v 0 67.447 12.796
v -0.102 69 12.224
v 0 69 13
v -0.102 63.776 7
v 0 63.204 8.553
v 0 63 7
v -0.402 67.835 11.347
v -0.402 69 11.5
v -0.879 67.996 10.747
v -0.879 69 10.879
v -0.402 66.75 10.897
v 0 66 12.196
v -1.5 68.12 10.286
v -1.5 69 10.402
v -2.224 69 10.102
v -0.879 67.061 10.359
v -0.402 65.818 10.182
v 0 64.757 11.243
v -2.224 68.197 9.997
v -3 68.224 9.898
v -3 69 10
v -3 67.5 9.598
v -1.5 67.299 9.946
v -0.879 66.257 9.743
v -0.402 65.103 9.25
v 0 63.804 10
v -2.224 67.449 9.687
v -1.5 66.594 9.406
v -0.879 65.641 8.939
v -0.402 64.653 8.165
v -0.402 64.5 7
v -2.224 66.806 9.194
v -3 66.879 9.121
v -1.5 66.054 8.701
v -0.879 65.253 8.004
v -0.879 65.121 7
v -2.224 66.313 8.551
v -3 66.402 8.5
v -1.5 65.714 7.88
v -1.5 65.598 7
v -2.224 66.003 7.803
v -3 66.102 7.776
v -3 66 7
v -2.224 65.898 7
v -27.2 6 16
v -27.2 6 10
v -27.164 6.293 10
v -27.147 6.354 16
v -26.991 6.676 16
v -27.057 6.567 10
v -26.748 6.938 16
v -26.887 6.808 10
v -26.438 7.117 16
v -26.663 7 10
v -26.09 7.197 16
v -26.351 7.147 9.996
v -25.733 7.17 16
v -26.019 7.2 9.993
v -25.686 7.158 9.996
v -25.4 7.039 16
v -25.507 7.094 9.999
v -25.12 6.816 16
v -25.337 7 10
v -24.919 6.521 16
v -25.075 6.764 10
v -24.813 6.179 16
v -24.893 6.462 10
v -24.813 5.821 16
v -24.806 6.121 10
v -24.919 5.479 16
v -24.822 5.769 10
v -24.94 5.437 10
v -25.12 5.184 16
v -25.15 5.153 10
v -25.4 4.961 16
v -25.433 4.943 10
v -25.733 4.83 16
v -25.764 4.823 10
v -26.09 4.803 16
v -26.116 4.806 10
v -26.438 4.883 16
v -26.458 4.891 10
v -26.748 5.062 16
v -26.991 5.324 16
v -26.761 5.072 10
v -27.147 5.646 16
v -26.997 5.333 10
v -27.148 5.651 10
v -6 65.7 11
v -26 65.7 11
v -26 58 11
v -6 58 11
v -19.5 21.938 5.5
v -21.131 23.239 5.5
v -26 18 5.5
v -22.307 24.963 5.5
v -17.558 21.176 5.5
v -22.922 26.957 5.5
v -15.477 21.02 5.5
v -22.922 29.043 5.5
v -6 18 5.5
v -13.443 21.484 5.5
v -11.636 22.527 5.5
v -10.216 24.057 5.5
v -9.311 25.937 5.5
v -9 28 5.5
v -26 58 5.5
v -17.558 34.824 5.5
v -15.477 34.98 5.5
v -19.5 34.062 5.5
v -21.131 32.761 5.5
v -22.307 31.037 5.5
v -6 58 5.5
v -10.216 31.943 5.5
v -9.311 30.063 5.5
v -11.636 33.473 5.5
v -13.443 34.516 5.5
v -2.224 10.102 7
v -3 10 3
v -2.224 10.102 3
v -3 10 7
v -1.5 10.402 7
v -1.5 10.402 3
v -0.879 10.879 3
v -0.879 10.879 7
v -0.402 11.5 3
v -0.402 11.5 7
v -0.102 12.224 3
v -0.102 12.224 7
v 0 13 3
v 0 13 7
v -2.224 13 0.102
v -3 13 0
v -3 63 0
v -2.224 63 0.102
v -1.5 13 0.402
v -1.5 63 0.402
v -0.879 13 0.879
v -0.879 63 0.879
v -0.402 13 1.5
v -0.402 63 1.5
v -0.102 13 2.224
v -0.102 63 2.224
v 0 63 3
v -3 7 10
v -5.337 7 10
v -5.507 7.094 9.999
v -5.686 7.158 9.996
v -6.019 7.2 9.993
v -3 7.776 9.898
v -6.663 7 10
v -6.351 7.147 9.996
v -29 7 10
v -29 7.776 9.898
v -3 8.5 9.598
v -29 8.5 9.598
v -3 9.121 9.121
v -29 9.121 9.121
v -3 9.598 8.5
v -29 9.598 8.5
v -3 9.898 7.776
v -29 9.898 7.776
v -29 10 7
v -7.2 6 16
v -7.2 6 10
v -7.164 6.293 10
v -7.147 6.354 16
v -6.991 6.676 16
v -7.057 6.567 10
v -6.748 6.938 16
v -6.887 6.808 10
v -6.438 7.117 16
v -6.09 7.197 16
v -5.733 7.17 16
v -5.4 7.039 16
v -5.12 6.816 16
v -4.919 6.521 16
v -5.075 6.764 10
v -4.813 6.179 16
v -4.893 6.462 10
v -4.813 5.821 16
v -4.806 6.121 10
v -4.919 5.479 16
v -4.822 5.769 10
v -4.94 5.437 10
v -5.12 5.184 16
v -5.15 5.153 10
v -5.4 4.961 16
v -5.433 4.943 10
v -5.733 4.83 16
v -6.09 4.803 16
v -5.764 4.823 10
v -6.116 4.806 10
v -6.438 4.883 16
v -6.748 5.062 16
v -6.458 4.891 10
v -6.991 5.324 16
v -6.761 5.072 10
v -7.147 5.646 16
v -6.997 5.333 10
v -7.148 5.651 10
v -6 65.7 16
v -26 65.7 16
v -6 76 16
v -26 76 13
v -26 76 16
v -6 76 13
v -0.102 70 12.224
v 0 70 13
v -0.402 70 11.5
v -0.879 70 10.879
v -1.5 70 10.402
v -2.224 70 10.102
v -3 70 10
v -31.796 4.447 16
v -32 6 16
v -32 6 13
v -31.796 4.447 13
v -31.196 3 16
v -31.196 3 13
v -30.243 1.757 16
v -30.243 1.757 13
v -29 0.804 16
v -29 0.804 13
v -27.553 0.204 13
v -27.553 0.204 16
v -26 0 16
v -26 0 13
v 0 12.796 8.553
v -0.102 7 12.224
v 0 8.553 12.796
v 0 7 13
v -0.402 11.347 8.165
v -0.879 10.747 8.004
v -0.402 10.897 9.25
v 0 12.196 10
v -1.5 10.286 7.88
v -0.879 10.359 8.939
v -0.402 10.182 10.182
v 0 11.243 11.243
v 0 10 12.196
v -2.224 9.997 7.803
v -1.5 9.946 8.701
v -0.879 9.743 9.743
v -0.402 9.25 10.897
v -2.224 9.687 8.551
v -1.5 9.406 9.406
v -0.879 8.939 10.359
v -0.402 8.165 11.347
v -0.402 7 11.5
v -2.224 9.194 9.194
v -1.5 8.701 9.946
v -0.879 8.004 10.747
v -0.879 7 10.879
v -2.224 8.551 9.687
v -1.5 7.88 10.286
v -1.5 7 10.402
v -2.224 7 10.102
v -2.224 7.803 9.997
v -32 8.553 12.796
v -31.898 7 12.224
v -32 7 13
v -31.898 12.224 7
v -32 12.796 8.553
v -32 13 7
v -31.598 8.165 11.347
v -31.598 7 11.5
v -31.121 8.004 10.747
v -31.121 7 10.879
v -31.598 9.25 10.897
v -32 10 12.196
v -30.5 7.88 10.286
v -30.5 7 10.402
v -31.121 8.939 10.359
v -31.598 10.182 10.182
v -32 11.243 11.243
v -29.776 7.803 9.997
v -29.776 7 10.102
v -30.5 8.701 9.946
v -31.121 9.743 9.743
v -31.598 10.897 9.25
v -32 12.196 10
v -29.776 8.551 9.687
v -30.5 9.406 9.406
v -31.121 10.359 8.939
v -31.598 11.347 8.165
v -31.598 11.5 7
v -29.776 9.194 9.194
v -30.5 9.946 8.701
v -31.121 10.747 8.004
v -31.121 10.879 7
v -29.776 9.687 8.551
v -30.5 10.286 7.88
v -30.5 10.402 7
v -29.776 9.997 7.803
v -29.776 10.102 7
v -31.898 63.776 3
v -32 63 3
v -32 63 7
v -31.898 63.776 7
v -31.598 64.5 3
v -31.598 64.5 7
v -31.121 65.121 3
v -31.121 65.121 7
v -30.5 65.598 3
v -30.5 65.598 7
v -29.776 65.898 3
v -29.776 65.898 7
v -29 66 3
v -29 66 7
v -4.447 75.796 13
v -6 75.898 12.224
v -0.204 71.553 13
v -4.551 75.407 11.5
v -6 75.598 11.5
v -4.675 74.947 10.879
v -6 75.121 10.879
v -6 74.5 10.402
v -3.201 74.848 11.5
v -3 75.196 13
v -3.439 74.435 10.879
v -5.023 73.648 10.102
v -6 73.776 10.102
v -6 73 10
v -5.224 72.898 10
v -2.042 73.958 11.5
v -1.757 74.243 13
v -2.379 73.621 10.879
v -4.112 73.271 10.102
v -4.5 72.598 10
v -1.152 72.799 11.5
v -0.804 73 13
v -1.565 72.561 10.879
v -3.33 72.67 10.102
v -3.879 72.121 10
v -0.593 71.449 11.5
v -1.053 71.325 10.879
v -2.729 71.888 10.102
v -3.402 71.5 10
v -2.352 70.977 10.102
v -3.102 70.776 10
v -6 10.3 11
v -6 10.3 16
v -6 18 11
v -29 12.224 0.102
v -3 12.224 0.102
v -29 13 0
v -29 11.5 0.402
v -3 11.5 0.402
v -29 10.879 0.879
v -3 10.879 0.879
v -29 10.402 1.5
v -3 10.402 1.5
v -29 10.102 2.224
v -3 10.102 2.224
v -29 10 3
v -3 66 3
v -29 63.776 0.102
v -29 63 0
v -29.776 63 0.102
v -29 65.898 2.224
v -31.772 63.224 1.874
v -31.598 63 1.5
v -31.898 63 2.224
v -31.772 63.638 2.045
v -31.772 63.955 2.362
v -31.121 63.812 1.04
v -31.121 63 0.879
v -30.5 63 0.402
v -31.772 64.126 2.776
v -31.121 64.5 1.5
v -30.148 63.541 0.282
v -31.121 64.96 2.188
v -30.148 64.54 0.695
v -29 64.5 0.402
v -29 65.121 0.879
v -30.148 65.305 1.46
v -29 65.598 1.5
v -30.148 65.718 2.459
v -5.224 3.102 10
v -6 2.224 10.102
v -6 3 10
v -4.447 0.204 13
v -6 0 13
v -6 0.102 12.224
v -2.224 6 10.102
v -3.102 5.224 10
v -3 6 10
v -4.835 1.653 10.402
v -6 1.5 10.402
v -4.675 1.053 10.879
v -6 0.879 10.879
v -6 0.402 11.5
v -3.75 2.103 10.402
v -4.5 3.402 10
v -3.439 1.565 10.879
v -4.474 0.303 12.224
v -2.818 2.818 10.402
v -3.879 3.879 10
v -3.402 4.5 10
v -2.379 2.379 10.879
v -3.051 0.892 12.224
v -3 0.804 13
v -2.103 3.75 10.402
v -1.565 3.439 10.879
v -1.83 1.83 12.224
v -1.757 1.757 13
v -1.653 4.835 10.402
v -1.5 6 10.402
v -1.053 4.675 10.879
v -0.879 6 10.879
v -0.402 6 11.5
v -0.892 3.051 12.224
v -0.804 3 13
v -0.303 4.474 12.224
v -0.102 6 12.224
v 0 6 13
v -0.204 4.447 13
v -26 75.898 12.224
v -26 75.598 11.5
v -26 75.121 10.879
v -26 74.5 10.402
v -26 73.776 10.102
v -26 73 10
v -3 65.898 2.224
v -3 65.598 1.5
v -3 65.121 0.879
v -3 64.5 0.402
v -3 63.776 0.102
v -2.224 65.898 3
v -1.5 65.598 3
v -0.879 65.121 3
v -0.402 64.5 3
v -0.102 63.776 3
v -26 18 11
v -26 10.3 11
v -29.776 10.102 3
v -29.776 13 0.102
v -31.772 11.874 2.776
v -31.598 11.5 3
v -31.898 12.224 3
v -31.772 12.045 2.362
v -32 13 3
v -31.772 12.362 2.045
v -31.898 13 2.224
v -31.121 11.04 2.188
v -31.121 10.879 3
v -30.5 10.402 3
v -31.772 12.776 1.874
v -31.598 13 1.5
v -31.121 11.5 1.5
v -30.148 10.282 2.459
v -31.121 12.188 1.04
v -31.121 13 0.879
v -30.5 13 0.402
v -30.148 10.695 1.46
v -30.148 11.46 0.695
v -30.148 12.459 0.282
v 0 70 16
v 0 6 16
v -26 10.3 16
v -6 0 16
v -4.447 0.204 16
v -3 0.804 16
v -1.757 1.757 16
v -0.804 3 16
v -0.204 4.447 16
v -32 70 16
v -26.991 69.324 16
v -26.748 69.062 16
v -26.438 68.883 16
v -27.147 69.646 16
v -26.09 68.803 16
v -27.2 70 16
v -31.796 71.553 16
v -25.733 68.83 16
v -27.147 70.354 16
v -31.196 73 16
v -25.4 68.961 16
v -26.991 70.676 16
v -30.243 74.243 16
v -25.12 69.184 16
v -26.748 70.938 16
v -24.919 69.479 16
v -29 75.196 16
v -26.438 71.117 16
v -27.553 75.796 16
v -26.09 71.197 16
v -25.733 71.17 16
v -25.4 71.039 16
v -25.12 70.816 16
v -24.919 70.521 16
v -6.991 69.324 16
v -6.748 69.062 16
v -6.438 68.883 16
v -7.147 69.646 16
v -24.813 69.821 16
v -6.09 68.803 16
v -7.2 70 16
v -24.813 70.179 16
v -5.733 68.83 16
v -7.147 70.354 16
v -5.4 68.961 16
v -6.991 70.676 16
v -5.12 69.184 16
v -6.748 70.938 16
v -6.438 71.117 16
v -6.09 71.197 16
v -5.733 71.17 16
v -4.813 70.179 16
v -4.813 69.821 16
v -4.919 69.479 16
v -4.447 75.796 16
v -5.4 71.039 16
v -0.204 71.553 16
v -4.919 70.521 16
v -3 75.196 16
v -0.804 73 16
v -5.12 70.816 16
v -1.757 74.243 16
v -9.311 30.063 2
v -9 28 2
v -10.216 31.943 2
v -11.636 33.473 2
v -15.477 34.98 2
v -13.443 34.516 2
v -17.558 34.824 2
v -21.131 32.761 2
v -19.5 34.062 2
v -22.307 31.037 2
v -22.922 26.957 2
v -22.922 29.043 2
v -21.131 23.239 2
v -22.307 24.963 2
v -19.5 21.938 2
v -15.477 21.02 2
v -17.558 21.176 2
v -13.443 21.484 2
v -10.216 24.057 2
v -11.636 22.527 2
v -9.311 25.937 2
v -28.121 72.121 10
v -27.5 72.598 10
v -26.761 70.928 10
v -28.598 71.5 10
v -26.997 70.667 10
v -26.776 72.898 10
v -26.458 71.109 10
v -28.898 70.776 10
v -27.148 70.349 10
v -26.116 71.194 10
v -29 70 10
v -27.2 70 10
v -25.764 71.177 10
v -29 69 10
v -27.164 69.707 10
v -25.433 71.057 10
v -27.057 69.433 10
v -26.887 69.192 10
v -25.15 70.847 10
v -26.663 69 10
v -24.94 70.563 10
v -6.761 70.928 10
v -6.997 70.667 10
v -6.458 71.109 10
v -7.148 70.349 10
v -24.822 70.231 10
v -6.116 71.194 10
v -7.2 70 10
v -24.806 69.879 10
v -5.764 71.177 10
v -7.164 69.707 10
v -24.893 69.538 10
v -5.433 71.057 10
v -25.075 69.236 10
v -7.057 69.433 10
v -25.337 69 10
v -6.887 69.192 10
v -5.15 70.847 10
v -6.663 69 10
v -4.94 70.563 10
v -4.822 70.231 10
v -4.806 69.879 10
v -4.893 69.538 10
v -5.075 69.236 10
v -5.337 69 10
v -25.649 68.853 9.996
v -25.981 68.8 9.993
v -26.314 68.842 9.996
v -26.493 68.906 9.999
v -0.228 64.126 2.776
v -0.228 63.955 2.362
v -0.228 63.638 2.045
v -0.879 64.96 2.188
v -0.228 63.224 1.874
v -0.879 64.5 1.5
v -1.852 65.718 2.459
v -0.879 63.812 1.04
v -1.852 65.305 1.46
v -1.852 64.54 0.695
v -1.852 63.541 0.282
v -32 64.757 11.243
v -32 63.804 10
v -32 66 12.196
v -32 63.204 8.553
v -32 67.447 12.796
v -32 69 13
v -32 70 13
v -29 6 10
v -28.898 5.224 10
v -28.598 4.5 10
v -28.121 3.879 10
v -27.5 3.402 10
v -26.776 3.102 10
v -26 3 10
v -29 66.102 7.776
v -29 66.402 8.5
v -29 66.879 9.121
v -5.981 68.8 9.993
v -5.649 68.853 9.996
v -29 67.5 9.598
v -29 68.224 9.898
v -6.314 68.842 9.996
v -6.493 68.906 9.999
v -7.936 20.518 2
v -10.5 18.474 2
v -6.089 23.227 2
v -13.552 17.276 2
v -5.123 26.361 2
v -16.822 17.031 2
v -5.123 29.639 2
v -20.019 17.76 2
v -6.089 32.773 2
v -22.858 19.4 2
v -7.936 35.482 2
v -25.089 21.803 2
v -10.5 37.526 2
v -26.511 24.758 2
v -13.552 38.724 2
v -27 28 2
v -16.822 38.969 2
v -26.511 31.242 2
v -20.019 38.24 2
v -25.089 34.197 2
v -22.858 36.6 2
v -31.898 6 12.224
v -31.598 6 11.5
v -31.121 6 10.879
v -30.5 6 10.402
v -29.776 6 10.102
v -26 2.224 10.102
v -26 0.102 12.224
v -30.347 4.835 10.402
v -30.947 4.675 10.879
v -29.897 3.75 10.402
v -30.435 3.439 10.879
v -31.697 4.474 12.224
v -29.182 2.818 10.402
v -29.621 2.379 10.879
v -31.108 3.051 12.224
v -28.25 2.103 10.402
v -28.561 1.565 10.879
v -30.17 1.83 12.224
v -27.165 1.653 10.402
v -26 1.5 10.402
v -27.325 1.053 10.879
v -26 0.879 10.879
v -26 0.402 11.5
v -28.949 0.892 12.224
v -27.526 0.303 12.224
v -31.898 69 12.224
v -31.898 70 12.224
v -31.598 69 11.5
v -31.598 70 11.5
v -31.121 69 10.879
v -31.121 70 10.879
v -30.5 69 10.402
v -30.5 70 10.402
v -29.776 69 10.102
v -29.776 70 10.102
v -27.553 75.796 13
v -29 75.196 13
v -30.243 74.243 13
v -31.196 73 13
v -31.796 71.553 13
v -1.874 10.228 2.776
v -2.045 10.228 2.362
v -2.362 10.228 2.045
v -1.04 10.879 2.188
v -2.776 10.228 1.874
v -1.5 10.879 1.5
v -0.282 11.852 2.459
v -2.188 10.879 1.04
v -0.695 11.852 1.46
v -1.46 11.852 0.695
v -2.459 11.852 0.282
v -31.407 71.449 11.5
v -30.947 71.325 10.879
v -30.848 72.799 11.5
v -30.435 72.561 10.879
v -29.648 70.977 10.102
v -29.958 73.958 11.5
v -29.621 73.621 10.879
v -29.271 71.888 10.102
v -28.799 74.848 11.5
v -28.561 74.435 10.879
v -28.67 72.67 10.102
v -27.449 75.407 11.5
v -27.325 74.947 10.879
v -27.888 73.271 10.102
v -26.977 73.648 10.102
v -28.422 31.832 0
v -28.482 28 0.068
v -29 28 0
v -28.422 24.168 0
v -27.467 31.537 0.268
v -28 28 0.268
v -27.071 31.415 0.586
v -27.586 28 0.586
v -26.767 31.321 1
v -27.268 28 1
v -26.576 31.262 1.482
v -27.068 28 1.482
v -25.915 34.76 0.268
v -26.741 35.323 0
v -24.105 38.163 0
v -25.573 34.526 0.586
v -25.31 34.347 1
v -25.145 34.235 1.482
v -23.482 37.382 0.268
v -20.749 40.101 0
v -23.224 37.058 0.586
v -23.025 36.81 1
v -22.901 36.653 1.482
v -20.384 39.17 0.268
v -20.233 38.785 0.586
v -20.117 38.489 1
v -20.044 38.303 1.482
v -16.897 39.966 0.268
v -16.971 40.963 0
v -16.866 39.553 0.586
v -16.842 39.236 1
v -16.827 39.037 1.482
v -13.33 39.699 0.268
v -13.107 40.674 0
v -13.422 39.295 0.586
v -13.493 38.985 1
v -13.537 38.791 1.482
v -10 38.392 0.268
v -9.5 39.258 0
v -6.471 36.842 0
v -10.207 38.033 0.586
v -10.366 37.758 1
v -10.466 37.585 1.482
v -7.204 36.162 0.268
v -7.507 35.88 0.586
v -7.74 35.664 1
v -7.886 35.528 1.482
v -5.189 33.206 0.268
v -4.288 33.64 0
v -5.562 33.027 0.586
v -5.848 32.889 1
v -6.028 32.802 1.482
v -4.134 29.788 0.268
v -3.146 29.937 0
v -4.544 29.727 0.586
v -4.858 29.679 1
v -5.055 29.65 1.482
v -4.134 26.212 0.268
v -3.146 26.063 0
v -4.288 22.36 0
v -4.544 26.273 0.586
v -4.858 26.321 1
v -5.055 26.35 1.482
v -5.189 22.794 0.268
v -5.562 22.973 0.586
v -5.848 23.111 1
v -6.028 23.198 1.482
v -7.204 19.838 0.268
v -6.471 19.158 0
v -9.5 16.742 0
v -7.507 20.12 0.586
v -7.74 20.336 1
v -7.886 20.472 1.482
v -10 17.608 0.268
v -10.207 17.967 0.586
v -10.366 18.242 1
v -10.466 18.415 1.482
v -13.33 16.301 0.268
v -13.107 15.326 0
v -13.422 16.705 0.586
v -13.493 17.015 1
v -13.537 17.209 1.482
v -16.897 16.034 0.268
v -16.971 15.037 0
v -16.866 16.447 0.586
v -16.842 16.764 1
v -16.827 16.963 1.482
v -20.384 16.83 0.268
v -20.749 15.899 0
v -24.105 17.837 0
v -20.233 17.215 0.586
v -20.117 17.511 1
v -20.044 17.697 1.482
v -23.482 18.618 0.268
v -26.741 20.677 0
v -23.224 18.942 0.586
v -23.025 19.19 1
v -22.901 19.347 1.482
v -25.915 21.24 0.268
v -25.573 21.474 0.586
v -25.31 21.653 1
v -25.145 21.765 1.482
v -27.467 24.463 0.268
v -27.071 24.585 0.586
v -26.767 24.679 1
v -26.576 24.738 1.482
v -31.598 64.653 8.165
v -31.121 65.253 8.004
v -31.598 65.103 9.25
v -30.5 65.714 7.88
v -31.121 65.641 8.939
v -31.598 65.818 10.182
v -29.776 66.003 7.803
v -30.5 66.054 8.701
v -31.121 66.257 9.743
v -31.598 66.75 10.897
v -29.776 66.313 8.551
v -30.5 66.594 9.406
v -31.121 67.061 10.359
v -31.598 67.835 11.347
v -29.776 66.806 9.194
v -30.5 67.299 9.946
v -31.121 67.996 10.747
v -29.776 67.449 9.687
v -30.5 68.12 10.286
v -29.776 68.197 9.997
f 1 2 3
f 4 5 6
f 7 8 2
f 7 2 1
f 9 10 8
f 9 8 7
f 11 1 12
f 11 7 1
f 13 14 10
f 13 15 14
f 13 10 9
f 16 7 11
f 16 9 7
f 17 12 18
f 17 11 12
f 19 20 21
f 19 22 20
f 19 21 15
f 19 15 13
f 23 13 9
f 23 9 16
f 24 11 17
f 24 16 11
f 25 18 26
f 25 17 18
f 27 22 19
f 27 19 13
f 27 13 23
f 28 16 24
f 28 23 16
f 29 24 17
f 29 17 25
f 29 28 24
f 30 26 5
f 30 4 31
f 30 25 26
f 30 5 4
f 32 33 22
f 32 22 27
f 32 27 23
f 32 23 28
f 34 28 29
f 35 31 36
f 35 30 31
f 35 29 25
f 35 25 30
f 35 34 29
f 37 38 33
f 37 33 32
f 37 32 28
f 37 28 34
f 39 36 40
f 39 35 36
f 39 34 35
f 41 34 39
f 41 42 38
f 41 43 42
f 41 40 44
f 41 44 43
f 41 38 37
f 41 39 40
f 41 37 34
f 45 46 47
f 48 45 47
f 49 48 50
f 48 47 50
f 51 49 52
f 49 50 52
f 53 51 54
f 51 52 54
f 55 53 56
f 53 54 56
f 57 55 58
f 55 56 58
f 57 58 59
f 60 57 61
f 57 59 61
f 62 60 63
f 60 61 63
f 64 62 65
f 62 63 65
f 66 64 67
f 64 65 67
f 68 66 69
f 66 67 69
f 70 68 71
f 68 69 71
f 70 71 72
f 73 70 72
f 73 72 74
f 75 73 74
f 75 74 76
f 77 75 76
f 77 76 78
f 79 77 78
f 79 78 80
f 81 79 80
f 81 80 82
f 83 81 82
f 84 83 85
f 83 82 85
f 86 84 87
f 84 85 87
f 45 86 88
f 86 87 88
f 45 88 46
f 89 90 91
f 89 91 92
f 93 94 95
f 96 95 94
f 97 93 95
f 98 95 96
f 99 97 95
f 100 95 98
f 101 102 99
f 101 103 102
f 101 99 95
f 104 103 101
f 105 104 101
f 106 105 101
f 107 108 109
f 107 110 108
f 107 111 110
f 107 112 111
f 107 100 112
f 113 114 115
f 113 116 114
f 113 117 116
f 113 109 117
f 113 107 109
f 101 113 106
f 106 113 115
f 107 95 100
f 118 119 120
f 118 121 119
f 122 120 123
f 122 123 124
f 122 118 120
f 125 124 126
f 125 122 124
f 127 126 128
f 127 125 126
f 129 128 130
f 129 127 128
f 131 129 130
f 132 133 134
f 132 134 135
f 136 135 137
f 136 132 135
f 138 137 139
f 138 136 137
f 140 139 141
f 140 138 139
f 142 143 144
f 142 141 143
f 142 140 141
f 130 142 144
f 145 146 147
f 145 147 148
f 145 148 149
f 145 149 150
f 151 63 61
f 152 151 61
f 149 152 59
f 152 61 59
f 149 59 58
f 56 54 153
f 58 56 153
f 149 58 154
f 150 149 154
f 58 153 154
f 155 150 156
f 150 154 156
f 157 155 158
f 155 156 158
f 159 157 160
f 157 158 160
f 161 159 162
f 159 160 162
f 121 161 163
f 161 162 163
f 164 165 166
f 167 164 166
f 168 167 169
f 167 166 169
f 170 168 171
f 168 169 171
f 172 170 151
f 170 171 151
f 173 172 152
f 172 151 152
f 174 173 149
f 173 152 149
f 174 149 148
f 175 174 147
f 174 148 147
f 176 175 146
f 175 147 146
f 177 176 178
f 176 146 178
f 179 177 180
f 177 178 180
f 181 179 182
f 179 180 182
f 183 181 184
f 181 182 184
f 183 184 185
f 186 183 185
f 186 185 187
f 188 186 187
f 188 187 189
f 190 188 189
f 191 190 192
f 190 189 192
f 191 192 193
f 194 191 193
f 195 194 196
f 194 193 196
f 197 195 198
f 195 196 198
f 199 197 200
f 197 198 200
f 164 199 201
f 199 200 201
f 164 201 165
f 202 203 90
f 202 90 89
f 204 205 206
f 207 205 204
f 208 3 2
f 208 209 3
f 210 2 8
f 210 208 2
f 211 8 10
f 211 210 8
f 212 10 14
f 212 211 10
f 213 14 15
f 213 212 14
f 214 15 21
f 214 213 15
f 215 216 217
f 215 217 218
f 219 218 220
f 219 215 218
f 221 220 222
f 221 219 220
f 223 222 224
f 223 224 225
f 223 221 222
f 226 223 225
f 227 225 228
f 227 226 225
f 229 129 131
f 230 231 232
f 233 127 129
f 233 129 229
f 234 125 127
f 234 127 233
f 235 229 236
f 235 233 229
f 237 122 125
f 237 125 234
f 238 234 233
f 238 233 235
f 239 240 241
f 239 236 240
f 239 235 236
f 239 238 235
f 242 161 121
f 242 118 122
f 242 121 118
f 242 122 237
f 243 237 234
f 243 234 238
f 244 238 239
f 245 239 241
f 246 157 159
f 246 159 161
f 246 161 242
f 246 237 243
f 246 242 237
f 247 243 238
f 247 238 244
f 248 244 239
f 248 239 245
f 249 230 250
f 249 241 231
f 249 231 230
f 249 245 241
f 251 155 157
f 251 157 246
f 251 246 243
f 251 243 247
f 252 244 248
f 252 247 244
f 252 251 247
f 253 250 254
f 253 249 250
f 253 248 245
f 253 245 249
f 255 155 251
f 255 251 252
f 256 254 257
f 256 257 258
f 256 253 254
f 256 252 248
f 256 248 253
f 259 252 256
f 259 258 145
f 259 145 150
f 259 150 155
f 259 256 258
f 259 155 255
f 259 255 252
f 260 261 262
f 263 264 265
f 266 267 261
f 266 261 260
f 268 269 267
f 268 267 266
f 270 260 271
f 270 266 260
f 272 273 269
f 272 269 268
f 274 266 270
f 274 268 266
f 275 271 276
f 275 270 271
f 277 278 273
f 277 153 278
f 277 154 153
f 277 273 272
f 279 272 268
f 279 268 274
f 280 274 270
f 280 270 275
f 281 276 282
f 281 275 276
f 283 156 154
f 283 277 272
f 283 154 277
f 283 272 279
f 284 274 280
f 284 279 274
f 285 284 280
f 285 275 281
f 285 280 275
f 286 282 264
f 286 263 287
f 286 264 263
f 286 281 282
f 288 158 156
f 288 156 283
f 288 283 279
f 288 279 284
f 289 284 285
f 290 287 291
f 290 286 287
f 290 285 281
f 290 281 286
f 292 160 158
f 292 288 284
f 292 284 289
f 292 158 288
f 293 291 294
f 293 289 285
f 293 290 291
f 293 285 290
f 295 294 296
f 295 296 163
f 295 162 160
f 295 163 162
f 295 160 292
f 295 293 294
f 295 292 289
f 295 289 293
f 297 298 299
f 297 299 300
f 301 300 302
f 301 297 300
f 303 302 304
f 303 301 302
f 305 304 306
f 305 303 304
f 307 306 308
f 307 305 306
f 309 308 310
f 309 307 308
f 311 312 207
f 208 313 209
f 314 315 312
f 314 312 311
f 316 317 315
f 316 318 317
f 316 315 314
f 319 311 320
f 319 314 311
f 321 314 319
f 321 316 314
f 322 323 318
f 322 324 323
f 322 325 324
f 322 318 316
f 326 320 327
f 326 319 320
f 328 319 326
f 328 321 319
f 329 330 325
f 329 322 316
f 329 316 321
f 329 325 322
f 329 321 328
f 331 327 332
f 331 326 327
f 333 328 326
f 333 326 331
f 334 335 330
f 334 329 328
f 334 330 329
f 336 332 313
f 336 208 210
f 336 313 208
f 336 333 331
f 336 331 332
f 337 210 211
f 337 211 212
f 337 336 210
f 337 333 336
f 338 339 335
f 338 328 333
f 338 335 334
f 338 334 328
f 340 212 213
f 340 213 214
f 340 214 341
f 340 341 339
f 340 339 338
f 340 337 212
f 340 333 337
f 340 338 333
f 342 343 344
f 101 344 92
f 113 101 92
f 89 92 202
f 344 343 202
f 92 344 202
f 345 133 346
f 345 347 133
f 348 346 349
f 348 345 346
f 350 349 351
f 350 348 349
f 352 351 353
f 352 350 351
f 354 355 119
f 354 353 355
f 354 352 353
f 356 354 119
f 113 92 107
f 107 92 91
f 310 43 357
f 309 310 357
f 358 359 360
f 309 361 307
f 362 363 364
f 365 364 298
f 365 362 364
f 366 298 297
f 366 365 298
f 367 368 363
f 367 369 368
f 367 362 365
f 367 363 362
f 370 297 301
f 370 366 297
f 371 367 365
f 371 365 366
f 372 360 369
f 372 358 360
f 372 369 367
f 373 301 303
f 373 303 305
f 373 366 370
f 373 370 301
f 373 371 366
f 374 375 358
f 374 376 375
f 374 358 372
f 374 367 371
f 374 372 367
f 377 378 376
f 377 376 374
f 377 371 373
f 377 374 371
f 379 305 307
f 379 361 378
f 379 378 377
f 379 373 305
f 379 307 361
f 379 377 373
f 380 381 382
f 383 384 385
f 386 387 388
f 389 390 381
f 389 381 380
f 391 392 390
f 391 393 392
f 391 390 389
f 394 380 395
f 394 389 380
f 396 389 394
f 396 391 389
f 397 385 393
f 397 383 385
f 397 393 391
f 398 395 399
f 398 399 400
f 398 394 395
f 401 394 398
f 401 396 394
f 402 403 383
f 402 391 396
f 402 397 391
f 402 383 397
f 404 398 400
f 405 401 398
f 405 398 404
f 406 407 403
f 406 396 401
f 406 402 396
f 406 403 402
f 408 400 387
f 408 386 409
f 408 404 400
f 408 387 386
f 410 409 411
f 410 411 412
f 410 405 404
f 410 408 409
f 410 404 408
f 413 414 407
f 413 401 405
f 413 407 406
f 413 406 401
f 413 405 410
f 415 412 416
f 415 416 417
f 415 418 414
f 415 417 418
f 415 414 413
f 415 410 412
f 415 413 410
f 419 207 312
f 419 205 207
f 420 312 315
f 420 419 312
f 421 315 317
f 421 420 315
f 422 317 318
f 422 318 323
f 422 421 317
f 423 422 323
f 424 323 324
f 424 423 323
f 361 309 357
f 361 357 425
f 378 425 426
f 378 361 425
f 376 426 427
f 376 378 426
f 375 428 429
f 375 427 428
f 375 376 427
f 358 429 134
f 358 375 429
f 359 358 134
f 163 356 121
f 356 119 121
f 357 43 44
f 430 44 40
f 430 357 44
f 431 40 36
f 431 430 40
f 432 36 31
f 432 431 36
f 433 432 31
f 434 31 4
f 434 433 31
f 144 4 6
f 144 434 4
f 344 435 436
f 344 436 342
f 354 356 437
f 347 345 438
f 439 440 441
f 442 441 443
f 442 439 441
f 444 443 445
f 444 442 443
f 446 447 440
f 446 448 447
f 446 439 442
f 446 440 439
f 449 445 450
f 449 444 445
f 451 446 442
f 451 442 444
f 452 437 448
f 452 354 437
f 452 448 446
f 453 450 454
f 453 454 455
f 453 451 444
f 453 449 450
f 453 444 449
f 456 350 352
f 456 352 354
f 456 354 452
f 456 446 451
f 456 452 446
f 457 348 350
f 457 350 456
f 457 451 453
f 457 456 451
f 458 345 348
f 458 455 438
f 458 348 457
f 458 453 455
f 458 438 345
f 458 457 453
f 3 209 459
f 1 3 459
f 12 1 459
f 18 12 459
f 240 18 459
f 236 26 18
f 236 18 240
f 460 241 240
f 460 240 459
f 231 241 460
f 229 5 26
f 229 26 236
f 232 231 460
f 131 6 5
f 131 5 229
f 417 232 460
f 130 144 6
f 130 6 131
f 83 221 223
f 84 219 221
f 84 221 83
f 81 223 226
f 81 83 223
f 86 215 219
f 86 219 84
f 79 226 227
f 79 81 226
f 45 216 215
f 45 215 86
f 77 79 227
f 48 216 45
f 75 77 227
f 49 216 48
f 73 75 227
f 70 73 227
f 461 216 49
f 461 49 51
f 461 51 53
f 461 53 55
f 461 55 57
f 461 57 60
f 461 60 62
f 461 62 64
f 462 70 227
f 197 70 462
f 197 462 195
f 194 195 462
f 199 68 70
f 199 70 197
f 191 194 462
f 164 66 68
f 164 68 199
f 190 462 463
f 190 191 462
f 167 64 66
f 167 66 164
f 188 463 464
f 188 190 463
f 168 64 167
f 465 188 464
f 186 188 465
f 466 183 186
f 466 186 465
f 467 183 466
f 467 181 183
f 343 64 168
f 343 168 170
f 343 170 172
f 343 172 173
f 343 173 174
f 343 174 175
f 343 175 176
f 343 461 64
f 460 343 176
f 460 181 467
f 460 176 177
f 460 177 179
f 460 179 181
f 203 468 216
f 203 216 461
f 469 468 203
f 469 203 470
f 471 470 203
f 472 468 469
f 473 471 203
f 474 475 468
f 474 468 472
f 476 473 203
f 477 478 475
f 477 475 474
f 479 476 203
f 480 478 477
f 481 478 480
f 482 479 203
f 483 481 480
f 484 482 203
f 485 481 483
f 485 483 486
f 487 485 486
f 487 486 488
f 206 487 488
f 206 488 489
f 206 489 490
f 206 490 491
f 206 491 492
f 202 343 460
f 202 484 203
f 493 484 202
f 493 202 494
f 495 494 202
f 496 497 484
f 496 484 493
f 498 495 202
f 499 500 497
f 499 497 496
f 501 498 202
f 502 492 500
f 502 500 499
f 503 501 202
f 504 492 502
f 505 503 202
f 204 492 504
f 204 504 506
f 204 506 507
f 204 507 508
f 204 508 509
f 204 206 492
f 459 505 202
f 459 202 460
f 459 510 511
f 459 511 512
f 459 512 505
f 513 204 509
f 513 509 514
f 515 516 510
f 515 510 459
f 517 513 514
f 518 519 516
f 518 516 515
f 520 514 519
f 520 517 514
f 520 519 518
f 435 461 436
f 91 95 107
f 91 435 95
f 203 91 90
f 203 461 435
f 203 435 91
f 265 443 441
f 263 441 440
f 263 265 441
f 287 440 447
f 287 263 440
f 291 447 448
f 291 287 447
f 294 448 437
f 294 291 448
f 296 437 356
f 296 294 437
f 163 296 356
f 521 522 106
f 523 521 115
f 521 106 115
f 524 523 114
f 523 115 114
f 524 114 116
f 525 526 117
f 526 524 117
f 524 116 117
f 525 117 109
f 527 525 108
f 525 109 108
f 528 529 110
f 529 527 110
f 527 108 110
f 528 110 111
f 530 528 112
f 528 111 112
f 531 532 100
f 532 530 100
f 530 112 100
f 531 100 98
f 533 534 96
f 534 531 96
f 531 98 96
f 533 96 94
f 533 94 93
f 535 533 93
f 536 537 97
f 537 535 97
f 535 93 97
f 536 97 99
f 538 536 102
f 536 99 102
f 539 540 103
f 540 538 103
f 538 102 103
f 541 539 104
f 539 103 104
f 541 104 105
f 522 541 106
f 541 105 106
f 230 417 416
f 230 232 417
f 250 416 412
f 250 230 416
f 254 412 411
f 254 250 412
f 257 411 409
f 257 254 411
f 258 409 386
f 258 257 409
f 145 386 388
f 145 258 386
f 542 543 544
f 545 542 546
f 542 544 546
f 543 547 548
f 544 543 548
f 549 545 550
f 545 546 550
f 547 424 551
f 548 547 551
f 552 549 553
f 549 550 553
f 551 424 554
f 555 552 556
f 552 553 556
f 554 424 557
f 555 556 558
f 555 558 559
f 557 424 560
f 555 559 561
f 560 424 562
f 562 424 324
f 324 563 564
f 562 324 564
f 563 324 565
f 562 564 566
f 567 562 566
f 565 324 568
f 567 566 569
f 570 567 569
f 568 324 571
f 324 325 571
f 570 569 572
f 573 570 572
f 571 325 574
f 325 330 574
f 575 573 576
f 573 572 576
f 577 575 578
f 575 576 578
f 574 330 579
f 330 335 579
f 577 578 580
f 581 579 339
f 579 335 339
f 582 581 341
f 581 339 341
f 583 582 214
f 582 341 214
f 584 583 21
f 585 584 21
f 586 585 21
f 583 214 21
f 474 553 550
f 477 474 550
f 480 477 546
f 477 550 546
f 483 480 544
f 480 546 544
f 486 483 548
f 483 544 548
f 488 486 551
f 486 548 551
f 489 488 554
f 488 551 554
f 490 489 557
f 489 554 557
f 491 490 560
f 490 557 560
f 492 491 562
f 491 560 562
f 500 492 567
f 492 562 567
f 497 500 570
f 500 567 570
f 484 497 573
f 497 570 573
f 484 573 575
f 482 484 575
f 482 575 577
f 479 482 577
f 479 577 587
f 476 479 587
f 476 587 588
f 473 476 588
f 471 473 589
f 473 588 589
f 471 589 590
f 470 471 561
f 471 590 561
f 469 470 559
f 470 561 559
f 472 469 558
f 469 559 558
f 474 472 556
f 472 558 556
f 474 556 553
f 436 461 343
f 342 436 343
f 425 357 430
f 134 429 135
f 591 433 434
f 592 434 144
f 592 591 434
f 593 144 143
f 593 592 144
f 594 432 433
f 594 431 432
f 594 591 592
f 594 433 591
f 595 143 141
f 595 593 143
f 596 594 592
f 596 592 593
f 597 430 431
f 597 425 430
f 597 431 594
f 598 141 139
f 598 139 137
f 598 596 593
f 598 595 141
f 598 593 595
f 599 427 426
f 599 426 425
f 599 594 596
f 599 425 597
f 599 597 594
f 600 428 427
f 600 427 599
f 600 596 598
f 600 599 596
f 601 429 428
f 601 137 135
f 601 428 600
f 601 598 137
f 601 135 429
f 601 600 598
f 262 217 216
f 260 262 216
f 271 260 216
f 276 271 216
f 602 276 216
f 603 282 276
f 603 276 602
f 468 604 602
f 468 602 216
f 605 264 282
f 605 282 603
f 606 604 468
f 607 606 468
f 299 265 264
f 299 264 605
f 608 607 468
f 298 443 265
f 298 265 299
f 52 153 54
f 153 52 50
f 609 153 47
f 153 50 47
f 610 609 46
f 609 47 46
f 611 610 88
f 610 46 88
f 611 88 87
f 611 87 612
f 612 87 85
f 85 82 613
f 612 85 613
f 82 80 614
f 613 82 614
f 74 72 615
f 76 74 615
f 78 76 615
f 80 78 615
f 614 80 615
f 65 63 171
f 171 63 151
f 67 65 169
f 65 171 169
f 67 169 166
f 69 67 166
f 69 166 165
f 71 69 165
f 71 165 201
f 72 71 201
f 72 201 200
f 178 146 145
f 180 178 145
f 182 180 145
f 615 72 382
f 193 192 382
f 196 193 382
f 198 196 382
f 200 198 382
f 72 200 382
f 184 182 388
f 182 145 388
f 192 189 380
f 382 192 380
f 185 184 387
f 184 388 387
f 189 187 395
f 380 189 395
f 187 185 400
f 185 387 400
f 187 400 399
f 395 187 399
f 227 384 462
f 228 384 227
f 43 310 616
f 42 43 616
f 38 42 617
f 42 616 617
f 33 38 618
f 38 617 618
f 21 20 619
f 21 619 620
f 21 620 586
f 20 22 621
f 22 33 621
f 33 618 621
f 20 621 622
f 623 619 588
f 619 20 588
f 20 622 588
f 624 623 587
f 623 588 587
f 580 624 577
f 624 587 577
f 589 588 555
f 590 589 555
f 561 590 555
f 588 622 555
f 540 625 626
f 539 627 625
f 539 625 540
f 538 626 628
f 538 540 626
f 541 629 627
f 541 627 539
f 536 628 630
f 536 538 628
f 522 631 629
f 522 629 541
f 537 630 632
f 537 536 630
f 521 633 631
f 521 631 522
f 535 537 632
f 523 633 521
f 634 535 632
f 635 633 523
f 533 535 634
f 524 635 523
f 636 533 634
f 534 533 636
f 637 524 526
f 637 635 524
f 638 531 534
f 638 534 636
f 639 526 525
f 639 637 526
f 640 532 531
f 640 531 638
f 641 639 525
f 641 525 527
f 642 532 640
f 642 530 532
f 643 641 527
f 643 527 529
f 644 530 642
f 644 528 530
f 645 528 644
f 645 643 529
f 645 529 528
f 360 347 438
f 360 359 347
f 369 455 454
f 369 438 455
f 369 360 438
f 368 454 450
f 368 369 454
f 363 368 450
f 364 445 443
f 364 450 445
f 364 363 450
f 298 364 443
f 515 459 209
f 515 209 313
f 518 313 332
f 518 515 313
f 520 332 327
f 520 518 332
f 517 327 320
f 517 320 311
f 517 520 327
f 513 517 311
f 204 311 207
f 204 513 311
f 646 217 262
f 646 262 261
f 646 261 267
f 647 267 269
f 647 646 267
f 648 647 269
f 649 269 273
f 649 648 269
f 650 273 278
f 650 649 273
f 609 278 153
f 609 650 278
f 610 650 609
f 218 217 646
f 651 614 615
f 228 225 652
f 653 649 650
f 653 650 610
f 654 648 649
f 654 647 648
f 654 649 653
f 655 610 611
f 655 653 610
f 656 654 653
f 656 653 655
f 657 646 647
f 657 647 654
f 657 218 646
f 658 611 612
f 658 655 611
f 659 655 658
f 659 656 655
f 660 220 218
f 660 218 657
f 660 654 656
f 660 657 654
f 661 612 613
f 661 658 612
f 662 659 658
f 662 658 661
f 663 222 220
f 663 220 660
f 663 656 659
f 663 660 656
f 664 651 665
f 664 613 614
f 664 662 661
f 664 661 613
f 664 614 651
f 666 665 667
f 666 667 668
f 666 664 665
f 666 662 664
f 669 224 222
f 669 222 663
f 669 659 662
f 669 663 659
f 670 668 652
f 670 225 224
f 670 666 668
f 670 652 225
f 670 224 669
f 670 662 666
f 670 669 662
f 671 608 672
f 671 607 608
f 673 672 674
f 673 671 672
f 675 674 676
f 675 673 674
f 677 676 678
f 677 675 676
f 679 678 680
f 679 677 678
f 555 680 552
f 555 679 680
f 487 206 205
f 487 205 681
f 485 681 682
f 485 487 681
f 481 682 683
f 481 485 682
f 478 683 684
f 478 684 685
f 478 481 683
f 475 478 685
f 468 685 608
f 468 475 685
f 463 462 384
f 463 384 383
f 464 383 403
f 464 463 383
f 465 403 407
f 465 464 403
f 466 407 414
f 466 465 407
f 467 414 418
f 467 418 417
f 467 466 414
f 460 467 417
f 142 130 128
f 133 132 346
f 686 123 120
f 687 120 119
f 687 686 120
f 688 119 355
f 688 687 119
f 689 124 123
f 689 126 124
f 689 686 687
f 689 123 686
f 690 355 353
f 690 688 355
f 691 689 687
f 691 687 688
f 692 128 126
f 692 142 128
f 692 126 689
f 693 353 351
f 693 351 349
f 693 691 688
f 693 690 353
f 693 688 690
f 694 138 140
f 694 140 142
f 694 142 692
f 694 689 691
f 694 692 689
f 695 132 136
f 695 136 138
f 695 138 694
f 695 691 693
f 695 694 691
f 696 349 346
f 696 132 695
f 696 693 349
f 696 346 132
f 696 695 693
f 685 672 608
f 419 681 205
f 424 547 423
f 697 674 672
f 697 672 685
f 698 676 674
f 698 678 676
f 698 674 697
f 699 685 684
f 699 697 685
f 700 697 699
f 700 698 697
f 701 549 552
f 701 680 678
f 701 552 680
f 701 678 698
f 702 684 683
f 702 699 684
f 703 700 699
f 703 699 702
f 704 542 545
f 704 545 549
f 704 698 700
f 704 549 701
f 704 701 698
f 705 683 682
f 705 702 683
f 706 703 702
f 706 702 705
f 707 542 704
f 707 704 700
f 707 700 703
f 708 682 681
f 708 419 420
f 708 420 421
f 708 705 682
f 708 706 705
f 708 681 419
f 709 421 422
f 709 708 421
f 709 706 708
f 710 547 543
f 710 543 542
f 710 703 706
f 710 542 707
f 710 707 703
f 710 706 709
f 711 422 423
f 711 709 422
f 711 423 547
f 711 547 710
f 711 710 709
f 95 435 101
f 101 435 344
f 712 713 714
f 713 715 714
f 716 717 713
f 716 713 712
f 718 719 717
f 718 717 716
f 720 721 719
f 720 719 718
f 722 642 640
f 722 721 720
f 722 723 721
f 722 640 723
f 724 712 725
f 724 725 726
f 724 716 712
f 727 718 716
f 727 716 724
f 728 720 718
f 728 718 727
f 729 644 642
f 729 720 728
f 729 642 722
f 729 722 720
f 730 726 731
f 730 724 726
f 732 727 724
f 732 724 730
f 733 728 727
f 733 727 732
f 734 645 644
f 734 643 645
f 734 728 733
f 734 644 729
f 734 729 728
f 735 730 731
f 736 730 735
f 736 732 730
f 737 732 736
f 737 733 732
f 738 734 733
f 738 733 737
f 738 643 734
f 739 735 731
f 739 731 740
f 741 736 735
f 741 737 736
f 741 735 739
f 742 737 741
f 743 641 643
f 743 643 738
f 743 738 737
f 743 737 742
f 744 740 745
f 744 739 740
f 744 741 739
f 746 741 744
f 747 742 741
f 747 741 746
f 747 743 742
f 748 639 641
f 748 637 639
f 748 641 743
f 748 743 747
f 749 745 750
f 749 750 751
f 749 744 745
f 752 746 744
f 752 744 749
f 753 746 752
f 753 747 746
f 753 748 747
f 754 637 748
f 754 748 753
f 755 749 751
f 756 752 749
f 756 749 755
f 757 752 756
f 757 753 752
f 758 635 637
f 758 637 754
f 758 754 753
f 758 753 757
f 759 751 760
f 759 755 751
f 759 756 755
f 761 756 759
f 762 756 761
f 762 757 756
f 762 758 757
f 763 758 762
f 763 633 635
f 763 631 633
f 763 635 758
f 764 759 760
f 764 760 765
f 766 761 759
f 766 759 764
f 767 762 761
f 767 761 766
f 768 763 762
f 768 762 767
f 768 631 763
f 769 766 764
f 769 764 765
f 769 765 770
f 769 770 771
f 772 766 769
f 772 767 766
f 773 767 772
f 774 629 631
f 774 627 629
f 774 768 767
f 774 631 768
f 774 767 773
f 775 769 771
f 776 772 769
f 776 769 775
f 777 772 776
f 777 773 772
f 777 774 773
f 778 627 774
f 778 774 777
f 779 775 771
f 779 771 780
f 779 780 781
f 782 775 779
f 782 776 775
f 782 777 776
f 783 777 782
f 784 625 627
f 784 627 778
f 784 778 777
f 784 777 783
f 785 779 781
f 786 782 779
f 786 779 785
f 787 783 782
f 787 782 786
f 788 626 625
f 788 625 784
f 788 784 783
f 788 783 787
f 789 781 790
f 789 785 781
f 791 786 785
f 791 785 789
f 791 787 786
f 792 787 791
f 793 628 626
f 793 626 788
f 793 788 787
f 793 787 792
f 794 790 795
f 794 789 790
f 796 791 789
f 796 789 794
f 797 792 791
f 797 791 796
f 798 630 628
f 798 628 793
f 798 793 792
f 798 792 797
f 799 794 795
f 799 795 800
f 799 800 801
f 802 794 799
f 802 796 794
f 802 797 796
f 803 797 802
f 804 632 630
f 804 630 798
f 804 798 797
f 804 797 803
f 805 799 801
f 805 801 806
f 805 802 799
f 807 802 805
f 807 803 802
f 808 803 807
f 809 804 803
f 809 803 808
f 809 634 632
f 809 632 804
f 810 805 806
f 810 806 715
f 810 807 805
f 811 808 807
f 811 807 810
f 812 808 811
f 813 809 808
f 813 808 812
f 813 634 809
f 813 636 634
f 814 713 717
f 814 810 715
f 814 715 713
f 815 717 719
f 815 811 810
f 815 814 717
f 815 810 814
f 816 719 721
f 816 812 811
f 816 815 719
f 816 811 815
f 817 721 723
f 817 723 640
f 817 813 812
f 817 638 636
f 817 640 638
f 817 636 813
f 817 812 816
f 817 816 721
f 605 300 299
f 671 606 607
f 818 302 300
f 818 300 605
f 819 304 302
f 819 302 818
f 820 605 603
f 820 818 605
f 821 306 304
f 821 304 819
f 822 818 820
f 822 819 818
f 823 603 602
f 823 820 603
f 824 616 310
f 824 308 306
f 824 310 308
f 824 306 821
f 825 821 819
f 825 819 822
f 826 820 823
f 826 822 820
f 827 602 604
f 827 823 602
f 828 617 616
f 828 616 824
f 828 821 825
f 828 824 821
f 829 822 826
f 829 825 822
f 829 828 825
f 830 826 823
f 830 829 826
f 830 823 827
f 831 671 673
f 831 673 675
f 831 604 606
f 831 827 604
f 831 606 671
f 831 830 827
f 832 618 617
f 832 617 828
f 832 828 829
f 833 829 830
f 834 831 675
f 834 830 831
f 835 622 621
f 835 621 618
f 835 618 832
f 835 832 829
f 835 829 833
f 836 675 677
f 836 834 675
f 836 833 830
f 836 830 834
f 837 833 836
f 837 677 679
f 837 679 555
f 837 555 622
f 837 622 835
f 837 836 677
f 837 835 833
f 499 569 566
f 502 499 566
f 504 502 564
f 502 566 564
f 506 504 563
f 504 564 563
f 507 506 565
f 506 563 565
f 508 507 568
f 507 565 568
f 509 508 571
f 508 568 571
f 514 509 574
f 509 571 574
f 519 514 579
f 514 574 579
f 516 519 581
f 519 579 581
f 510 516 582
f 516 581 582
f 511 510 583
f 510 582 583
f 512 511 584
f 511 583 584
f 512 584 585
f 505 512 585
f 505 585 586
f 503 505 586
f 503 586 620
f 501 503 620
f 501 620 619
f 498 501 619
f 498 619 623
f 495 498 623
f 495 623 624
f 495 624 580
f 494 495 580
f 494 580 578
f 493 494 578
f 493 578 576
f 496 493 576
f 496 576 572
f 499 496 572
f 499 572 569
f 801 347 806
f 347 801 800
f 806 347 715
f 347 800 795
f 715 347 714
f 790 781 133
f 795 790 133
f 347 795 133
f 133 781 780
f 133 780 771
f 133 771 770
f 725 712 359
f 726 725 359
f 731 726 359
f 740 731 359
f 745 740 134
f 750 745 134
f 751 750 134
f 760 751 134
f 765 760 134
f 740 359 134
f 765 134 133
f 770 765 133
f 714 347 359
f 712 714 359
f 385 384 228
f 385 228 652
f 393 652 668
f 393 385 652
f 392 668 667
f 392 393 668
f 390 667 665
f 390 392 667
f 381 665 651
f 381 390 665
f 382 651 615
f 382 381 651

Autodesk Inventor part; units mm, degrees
ref_plane "YZ Plane" through (0, 0, 0) normal (1, 0, 0) x (0, 1, 0)
ref_plane "XZ Plane" through (0, 0, 0) normal (0, 1, 0) x (-1, 0, 0)
ref_plane "XY Plane" through (0, 0, 0) normal (0, 0, 1) x (1, 0, 0)
sketch "Sketch1" plane through (0, 0, 0) normal (0, 0, 1) x (1, 0, 0)
  line L0 (0, 0) -> (-32, 0)
  line L1 (-32, 0) -> (-32, 76)
  line L2 (-32, 76) -> (0, 76)
  line L3 (0, 76) -> (0, 0)
  dimension "d0" = 32
  dimension "d1" = 76
extrude "Extrusion1" add sketch "Sketch1" along normal blind 16
fillet "Fillet1" radius 6 4 edges at (0, 76, 8) (-32, 76, 8) (0, 0, 8) (-32, 0, 8)
sketch "Sketch2" plane through (0, 0, 16) normal (0, 0, 1) x (1, 0, 0)
  line L0 (-6, 58) -> (-26, 58)
  line L1 (-26, 58) -> (-26, 18)
  line L2 (-26, 18) -> (-6, 18)
  line L3 (-6, 18) -> (-6, 58)
  line L4 (-6, 76) -> (-26, 76) projected
  line L5 (0, 6) -> (0, 70) projected
  point P0 (0, 0)
  dimension "d5" = 20
  dimension "d6" = 40
  dimension "d7" = 18
  dimension "d8" = 6
extrude "Extrusion2" cut sketch "Sketch2" against normal blind 10.5
sketch "Sketch3" plane through (0, 0, 5.5) normal (0, 0, 1) x (1, 0, 0)
  circle A0 centre (-16, 28) radius 7
  line L0 (-6, 58) -> (-6, 18) projected
  line L1 (-6, 18) -> (-26, 18) projected
  point P0 (0, 0)
  dimension "d11" = 14
  dimension "d12" = 10
  dimension "d13" = 10
extrude "Extrusion3" cut sketch "Sketch3" against normal up to surface (5.5 mm away)
sketch "Sketch4" plane through (0, 0, 16) normal (0, 0, 1) x (1, 0, 0)
  line L0 (-26, 58) -> (-6, 58) projected
  line L1 (-6, 58) -> (-26, 58)
  line L2 (-26, 58) -> (-26, 65.7)
  line L3 (-26, 65.7) -> (-6, 65.7)
  line L4 (-6, 65.7) -> (-6, 58)
  line L5 (-6, 18) -> (-26, 18) projected
  line L6 (-6, 18) -> (-26, 18)
  line L7 (-26, 18) -> (-26, 10.3)
  line L8 (-26, 10.3) -> (-6, 10.3)
  line L9 (-6, 10.3) -> (-6, 18)
  point P0 (0, 0)
  point P1 (-26, 18)
  dimension "d16" = 7.7
  dimension "d17" = 20
  dimension "d18" = 7.7
extrude "Extrusion4" cut sketch "Sketch4" against normal blind 5
sketch "Sketch5" plane through (0, 6, 0) normal (1, 0, 0) x (0, 0, -1)
  line L0 (0, -6) -> (-16, -6) projected
  line L1 (0, -6) -> (0, 4)
  line L2 (0, 0) -> (0, -6) projected
  line L3 (0, 4) -> (-10, 4)
  line L4 (-10, 4) -> (-10, -6)
  line L5 (0, 70) -> (0, 64) projected
  line L6 (0, 70) -> (-10, 70)
  line L7 (-10, 70) -> (-10, 60)
  line L8 (-10, 60) -> (0, 60)
  line L9 (0, 60) -> (0, 70)
  dimension "d21" = 10
  dimension "d22" = 10
  dimension "d23" = 10
  dimension "d24" = 10
extrude "Extrusion5" cut sketch "Sketch5" against normal up to surface (32 mm away)
fillet "Fillet2" radius 3 20 edges at (-16, 66, 0) (0, 38, 0) (-16, 10, 0) (-32, 38, 0) (0, 66, 5) (-32, 66, 5) (0, 10, 5) (-16, 66, 10) (-32, 10, 5) (-16, 10, 10) (-16, 76, 10) (-30.2426, 74.2426, 10) (-32, 68, 10) (0, 68, 10) (-1.7574, 74.2426, 10) (-1.7574, 1.7574, 10) (0, 8, 10) (-30.2426, 1.7574, 10) (-32, 8, 10) (-16, 0, 10)
sketch "Sketch6" plane through (-3, 69, 10) normal (0, 0, -1) x (-1, 0, 0)
  arc A0 (26, 1) -> (23, 4) centre (23, 1) ccw projected
  circle A1 centre (23, 1) radius 1.2
  arc A2 (3, 4) -> (0, 1) centre (3, 1) ccw projected
  circle A3 centre (3, 1) radius 1.2
  arc A4 (0, -63) -> (3, -66) centre (3, -63) ccw projected
  circle A5 centre (3, -63) radius 1.2
  arc A6 (23, -66) -> (26, -63) centre (23, -63) ccw projected
  circle A7 centre (23, -63) radius 1.2
  point P0 (-3, -69)
  dimension "d28" = 2.4
  dimension "d29" = 2.4
  dimension "d30" = 2.4
  dimension "d31" = 2.4
extrude "Extrusion6" cut sketch "Sketch6" along normal blind 5 and the other way blind 10
sketch "Sketch7" plane through (0, 0, 0) normal (0, 0, -1) x (-1, 0, 0)
  circle A0 centre (16, 28) radius 7 projected
  circle A1 centre (16, 28) radius 11
  point P0 (0, 0)
  dimension "d36" = 22
extrude "Extrusion7" cut sketch "Sketch7" against normal blind 2
fillet "Fillet3" radius 2 1 edges at (-5, 28, 0)
properties part number "ramie03-7"
